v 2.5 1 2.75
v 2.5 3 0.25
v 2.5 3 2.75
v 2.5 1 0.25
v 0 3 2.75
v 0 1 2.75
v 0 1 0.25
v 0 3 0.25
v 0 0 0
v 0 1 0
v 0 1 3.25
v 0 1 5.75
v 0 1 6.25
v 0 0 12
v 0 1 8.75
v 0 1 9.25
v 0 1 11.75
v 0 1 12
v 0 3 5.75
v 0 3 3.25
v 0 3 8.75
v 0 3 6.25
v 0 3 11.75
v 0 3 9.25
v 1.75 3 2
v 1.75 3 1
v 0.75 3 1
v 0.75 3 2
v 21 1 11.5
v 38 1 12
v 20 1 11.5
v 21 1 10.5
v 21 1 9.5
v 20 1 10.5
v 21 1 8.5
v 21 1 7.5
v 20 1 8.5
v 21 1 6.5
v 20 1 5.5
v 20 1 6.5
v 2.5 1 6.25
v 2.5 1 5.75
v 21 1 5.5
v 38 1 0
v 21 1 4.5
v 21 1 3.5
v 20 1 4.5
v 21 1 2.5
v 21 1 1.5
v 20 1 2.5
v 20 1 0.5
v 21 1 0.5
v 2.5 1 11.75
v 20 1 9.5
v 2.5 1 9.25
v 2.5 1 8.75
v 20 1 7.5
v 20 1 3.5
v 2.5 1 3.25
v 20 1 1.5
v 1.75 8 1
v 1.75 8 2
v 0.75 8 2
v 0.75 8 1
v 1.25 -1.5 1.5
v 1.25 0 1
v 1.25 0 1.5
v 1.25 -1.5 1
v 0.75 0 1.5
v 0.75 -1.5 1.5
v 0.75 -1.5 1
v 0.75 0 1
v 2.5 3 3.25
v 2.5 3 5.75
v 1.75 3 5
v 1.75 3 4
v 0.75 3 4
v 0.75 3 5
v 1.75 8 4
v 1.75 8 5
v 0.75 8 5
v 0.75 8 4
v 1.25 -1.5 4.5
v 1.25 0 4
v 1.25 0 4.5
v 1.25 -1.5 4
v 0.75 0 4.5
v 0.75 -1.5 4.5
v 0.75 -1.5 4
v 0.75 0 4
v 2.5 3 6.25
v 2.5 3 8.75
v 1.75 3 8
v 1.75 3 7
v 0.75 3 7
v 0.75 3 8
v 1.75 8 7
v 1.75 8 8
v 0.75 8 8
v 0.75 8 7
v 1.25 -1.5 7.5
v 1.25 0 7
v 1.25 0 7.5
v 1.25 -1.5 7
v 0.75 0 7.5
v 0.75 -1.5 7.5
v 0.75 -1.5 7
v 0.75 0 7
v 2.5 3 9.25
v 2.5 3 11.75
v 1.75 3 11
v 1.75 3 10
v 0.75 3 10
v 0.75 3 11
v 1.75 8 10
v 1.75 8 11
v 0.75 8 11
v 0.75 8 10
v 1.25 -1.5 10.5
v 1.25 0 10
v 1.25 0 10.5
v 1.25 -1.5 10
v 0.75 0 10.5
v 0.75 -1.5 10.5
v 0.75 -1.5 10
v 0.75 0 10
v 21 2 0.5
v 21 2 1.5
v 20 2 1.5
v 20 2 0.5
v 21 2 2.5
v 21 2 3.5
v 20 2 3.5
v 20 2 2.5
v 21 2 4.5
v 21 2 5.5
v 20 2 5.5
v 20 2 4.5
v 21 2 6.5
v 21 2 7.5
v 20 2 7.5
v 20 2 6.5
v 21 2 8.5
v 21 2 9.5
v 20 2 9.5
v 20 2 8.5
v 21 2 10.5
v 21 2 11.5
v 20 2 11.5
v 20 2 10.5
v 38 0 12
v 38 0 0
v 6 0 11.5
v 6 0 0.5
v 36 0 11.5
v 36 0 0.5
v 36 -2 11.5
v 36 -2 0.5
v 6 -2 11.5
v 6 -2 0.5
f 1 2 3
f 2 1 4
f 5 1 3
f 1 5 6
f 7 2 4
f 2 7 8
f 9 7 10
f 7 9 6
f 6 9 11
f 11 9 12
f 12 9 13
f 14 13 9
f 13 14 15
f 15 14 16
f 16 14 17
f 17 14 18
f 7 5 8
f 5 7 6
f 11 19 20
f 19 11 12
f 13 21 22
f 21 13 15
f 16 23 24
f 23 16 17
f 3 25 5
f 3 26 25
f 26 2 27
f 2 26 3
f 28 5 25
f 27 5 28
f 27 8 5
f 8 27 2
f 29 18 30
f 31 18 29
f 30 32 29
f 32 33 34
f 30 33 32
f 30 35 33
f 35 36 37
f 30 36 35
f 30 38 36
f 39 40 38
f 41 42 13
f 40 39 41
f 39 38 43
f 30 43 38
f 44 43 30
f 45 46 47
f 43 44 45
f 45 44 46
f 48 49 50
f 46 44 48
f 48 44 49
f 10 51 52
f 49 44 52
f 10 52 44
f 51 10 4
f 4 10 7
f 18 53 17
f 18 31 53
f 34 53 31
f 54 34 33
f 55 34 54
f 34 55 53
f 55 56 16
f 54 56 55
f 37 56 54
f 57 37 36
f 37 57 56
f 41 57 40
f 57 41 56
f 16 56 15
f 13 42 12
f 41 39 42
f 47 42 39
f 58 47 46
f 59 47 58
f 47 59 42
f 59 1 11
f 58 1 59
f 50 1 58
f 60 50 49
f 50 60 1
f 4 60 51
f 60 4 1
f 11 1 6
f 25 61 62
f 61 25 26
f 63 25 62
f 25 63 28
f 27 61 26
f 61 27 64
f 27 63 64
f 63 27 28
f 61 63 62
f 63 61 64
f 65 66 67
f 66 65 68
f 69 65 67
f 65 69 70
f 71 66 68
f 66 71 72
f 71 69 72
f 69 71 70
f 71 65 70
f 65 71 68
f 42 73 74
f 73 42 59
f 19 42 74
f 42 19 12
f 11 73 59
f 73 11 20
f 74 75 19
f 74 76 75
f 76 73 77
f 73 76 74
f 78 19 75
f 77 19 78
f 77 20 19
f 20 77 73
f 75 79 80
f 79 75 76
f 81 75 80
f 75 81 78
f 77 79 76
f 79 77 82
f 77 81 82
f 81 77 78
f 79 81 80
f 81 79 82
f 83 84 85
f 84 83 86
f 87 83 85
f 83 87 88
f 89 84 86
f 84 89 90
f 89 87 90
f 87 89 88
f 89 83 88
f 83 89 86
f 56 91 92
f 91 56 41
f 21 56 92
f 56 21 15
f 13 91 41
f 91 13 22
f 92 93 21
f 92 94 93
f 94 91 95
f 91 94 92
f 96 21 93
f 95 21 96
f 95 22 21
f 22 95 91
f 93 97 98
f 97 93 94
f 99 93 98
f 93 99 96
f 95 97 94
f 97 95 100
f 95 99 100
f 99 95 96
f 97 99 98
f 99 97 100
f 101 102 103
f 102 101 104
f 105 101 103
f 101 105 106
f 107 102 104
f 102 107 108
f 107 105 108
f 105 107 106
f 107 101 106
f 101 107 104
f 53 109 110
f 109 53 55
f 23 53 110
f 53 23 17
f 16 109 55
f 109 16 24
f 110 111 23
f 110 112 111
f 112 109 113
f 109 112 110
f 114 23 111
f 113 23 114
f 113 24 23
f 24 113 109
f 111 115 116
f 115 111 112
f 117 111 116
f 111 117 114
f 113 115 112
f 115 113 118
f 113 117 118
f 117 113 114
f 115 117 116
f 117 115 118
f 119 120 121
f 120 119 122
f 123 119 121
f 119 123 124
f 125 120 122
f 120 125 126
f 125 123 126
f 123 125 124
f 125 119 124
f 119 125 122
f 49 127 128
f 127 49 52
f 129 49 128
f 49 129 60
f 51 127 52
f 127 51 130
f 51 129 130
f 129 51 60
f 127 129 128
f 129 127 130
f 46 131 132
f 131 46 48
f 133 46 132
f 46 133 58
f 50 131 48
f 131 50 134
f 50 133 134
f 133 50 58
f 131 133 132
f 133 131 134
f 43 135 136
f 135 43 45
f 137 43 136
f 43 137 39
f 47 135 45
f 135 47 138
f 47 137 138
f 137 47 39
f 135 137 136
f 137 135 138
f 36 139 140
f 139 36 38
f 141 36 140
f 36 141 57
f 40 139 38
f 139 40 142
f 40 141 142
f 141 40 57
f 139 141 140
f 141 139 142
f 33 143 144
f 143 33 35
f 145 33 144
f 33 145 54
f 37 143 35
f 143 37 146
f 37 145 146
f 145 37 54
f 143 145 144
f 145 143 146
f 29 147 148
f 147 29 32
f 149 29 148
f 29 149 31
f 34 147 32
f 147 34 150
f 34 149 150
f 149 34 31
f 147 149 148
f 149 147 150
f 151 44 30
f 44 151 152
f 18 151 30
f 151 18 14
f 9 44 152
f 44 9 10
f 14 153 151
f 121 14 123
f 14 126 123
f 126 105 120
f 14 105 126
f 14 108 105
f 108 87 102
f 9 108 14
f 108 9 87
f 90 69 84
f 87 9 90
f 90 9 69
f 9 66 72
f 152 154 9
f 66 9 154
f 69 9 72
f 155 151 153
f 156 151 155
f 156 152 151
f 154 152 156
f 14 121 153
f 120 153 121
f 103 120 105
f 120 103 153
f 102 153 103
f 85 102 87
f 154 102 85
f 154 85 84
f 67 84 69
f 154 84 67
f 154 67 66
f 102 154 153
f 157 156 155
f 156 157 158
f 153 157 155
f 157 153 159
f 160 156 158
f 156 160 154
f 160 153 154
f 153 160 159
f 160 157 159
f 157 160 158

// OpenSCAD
module display() {
    
    // board
    color("green")
    cube([38,1,12]);

    // display
    color("#444444")
    translate([6, -2, .5])
    cube([30,2,11]);

    // pins
    translate([0,0,.25])
    for (i=[0:3]) {
        color("black")
        translate([0, 1, i*3])
        cube([2.5,2,2.5]);

        color("yellow")
        translate([.75, 2, .75 + (i*3)])
        cube([1,6,1]);

        color("#AAAAAA")
        translate([0.75, -1.5, 0.75 + (i*3)])
        cube([.5,2,.5]);
    }

    // resistors
    for (i=[0:5]) {
        color("brown")
        translate([20, 1, i*2 + .5])
        cube([1,1,1]);
    }
}

display();
